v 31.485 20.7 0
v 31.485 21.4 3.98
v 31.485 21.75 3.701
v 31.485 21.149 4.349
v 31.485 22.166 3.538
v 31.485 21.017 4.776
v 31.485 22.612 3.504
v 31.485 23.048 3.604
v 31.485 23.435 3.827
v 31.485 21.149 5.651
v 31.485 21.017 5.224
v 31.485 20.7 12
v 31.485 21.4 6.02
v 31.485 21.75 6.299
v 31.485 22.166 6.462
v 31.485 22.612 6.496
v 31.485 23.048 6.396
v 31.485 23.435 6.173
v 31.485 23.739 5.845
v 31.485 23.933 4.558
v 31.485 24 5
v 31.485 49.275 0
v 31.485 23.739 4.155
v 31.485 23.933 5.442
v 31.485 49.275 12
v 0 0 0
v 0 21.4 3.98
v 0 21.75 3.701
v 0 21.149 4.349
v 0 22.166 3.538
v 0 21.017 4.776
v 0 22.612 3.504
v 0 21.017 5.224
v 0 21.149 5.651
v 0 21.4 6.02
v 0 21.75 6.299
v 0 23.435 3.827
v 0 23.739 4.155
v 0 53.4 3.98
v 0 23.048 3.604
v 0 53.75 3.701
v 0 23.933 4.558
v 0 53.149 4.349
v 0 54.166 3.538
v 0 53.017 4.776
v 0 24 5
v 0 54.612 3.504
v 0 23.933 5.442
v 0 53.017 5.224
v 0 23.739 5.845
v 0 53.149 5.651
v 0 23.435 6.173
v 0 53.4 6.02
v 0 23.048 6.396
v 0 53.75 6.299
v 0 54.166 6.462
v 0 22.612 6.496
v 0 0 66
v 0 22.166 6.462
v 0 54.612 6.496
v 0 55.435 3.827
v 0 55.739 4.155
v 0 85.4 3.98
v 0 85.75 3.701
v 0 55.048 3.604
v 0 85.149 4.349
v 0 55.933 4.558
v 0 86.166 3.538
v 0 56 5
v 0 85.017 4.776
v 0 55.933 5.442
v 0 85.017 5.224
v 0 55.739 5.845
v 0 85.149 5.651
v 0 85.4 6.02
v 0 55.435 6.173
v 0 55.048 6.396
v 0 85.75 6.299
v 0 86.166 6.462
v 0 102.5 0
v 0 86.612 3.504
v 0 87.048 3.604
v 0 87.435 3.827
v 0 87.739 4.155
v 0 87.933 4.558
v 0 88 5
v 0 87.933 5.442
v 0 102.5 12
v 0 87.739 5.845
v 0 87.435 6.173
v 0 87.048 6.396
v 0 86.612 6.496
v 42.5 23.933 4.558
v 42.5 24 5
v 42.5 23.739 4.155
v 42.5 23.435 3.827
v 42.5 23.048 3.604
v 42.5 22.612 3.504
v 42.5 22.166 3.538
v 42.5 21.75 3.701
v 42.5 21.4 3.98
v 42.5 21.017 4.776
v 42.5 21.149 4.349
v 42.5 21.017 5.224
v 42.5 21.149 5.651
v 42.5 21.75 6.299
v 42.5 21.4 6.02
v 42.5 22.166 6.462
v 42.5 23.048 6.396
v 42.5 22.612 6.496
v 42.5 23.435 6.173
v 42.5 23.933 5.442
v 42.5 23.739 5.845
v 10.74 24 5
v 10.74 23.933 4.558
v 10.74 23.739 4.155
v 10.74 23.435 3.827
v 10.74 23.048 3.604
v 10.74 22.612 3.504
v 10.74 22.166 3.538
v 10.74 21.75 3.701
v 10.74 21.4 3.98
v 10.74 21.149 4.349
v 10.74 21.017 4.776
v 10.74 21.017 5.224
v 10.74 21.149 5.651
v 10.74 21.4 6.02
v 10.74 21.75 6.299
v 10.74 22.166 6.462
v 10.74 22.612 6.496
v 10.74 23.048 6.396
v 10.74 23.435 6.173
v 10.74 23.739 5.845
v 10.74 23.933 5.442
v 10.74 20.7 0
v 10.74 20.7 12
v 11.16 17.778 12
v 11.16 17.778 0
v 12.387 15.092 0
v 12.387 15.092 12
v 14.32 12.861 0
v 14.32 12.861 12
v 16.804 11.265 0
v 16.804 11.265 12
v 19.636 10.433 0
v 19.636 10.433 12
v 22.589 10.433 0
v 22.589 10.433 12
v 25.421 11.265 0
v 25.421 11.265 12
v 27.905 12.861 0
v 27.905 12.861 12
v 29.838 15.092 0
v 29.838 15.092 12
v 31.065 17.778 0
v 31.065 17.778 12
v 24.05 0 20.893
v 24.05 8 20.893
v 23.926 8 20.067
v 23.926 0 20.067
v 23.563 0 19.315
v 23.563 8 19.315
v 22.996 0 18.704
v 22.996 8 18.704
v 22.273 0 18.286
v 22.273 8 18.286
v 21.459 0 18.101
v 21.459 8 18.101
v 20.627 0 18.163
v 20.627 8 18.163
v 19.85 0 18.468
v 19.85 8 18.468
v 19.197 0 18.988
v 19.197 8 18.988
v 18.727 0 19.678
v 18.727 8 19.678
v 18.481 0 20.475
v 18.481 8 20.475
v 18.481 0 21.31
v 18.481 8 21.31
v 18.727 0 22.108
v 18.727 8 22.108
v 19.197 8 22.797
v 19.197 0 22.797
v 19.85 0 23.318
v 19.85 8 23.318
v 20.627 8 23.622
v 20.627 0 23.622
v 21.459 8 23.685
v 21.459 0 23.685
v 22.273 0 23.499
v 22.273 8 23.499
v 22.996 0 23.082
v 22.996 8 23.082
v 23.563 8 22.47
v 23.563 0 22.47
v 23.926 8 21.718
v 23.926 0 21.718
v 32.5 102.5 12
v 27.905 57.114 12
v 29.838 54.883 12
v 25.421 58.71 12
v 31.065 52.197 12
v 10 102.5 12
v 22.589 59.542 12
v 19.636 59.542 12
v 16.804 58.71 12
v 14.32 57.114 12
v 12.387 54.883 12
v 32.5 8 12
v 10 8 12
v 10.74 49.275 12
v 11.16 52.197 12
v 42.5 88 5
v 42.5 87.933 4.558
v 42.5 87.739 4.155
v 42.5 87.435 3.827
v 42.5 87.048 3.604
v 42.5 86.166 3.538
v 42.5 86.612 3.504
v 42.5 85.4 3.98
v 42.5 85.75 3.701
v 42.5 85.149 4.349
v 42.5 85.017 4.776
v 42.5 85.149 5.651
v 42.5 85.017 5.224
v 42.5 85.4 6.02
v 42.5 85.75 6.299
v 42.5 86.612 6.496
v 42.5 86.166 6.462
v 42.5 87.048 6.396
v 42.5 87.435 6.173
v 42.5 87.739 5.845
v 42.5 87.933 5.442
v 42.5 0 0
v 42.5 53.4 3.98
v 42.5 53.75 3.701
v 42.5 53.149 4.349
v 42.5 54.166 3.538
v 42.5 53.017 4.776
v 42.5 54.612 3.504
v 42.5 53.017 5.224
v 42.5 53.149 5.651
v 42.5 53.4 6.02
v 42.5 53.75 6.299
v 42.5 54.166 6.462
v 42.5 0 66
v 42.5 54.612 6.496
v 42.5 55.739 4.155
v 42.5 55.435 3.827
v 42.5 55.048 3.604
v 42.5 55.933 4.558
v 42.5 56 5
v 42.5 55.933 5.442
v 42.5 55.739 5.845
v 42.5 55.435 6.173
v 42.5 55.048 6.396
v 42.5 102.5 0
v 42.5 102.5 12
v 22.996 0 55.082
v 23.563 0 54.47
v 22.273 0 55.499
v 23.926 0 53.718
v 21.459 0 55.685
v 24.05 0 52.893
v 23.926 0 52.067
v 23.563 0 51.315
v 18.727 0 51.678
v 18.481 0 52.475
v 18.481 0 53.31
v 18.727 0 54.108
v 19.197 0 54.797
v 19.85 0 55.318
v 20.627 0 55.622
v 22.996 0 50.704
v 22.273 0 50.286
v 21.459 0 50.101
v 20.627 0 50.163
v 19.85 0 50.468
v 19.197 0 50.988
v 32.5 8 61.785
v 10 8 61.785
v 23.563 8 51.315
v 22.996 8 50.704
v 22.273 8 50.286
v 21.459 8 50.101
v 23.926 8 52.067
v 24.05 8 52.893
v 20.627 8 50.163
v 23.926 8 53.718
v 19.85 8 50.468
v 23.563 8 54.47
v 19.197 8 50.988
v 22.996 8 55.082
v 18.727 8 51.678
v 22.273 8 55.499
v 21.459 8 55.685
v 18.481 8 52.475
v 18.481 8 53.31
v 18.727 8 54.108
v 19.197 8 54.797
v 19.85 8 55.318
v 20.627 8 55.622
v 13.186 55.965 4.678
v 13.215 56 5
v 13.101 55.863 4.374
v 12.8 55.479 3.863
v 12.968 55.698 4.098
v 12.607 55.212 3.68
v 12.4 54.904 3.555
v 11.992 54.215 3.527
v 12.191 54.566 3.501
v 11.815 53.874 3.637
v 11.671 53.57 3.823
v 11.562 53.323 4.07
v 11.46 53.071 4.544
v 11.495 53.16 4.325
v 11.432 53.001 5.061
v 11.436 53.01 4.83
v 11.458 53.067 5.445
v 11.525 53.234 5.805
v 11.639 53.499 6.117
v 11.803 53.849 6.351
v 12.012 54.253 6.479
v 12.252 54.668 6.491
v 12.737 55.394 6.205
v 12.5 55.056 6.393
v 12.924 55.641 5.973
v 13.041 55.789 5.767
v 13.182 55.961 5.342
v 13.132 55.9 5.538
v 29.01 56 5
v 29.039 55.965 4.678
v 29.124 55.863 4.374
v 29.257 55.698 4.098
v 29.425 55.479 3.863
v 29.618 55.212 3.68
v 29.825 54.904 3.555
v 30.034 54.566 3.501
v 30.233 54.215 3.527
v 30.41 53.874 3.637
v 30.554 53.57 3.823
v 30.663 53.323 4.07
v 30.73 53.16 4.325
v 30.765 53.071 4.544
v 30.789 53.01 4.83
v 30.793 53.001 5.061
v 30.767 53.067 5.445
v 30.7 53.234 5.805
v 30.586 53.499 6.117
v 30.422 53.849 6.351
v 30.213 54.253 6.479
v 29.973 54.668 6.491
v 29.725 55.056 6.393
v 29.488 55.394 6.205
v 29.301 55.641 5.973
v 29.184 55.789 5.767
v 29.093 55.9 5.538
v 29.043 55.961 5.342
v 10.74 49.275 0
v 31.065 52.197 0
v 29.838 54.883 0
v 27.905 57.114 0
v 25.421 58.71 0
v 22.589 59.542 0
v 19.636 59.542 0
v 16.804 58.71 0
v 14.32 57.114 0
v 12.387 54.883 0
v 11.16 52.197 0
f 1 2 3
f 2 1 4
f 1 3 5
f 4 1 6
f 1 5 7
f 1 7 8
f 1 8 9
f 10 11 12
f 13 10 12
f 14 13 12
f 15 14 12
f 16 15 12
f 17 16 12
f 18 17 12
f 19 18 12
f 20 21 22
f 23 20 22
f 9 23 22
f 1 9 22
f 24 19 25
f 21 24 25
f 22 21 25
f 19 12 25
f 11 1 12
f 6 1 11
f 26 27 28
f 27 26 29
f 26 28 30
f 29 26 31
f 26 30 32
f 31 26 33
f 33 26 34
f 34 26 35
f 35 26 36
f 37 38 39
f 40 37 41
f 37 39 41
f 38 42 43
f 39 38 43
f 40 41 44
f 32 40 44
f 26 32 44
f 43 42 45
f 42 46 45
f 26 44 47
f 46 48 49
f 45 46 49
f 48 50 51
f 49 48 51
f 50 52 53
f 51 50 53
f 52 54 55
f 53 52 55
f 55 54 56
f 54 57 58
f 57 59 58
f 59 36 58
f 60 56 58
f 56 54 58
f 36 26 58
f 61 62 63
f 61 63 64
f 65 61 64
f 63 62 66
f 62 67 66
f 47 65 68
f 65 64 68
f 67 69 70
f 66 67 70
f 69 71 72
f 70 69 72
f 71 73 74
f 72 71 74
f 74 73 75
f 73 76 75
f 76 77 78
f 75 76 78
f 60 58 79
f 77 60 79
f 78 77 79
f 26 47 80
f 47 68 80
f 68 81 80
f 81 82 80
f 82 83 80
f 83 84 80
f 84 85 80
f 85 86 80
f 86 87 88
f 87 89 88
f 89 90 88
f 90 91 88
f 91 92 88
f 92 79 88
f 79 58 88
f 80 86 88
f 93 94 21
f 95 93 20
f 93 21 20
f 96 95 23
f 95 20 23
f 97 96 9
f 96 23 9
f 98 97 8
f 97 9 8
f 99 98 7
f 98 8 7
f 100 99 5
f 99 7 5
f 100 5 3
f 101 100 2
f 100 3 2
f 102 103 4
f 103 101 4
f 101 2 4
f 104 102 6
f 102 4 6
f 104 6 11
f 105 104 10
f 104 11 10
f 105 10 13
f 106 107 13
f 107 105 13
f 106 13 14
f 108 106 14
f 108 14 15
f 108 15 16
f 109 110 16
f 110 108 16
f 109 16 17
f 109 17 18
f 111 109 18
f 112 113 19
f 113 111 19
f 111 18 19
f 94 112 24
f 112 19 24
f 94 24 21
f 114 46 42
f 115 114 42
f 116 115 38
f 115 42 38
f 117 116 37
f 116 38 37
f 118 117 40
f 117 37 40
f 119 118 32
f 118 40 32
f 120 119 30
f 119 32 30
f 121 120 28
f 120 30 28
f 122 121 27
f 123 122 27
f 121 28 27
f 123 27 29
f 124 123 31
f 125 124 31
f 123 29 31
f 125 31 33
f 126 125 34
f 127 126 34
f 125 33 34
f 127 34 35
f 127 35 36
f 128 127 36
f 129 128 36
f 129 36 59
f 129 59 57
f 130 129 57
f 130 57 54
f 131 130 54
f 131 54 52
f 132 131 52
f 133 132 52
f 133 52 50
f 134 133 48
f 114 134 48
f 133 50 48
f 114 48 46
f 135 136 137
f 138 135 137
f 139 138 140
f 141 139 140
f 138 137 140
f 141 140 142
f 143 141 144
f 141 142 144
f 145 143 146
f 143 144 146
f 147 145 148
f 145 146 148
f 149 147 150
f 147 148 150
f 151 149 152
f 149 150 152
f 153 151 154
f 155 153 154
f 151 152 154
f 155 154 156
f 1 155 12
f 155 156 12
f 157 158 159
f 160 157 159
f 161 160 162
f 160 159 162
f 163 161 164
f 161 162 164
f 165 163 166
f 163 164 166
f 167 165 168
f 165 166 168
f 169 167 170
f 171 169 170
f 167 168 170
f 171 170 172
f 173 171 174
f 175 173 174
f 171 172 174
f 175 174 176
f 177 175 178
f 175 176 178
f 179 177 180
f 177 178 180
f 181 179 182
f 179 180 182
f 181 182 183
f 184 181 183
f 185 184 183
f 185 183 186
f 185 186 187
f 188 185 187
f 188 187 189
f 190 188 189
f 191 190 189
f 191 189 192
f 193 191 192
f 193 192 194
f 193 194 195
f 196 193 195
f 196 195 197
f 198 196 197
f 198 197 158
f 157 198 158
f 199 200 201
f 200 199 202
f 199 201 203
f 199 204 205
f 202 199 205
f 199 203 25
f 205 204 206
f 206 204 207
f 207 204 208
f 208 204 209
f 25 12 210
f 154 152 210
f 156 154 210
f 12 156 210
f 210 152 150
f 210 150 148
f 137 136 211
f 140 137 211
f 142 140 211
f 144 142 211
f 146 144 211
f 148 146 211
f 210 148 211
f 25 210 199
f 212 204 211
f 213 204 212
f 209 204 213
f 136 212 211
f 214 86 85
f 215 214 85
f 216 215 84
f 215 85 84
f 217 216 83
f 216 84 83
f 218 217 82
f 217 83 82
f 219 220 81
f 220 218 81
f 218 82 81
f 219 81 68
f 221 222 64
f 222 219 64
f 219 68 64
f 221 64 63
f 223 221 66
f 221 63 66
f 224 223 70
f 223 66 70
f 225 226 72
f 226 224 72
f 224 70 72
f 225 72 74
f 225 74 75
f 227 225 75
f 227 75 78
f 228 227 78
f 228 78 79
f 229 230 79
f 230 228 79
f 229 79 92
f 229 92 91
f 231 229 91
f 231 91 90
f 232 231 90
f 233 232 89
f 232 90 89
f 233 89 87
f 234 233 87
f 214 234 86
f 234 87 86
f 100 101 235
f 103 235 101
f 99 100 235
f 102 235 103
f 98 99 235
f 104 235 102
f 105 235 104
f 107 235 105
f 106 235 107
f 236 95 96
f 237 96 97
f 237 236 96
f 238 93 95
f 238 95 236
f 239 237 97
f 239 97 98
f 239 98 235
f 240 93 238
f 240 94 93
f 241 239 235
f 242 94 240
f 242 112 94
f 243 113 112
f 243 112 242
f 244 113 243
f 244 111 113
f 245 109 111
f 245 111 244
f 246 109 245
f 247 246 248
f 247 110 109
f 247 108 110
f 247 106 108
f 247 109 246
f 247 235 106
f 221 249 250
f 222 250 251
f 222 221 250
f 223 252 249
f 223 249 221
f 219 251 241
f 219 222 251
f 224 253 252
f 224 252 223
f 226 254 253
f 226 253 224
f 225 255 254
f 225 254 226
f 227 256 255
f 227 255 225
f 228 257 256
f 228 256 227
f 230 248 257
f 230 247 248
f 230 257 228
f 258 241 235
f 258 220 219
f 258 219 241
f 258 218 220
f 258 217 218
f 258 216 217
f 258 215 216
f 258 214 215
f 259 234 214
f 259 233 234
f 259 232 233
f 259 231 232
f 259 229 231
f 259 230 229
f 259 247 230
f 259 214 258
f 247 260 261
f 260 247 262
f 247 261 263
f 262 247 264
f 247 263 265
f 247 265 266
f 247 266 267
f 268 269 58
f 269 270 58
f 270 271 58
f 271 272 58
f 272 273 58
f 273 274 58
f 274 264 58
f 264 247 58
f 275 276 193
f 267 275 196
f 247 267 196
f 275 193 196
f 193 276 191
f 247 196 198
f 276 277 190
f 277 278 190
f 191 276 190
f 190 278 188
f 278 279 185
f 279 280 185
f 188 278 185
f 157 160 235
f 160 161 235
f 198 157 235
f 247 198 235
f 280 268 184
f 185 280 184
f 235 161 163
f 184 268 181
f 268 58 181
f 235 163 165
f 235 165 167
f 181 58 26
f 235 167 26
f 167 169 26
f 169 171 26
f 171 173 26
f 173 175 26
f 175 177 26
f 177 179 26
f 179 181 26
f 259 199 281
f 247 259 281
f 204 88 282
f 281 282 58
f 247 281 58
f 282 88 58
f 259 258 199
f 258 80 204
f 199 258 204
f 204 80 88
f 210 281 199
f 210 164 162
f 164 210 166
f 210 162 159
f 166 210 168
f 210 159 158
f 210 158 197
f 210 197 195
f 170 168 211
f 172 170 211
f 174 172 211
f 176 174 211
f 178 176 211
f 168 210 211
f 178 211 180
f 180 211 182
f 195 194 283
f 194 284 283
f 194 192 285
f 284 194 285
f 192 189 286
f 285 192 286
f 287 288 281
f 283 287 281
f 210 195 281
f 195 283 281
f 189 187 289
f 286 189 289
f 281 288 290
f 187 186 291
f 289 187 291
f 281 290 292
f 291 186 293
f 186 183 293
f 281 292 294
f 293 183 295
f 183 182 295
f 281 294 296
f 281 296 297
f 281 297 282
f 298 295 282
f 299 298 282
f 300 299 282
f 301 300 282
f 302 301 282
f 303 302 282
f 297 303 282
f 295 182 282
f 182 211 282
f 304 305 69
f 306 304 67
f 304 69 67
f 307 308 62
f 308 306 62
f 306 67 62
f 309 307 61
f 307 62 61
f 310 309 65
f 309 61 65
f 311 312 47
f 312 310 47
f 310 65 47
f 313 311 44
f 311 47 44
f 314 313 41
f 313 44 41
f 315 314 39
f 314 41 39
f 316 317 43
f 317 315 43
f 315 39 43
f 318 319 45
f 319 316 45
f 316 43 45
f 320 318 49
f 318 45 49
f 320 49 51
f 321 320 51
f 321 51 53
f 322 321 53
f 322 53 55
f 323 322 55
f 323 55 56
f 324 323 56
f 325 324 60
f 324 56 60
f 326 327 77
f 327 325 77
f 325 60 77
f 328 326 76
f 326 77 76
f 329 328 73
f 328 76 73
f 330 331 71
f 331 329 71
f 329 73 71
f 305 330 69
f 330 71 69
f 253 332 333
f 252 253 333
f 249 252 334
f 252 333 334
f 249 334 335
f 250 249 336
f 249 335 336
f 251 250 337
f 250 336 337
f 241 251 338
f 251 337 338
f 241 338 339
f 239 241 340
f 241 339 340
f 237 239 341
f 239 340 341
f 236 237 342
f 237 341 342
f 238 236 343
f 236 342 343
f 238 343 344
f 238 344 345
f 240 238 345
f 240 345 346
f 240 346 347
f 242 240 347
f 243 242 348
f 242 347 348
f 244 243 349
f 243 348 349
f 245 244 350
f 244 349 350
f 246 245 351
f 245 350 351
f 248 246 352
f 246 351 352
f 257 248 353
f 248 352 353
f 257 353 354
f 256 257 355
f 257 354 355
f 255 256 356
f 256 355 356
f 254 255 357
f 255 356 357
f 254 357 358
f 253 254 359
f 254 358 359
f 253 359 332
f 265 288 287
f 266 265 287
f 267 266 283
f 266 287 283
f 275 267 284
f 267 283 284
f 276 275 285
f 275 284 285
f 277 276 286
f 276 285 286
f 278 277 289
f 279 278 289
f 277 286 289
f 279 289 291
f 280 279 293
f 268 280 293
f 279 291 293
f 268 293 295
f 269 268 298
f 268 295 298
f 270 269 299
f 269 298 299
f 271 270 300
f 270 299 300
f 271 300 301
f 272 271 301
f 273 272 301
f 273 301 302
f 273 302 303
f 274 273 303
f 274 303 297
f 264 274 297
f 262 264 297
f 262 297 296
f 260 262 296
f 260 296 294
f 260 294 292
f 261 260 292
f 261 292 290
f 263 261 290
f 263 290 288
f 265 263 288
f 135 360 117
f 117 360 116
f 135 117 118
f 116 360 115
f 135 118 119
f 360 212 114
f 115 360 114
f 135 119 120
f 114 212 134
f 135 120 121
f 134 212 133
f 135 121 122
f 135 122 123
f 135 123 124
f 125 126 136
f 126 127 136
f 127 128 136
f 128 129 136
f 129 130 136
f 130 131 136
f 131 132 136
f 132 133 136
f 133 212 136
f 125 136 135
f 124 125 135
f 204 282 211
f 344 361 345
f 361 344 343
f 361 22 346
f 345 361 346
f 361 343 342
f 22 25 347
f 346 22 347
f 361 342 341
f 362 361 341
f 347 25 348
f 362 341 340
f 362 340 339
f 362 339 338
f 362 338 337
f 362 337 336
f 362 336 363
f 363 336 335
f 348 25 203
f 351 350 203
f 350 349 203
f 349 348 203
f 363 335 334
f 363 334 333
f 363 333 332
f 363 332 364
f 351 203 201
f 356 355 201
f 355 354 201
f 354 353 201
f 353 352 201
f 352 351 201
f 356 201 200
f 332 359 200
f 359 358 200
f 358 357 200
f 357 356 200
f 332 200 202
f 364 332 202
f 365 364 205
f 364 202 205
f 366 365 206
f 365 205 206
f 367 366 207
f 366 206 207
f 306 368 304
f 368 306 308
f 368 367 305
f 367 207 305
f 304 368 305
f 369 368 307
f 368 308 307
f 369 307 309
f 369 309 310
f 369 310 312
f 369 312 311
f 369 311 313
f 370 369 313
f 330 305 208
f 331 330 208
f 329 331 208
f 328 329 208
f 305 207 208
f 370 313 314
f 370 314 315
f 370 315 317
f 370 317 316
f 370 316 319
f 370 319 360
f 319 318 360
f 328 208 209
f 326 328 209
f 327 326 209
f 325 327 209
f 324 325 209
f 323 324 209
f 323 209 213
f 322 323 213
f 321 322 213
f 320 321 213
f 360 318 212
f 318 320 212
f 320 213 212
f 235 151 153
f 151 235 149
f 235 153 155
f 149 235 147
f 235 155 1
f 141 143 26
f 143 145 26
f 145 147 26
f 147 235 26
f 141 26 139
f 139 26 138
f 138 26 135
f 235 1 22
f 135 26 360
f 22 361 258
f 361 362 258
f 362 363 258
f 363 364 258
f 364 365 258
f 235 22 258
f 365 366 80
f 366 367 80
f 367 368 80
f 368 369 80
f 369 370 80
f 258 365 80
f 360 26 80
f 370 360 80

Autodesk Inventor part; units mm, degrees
ref_plane "YZ Plane" through (0, 0, 0) normal (1, 0, 0) x (0, 1, 0)
ref_plane "XZ Plane" through (0, 0, 0) normal (0, 1, 0) x (-1, 0, 0)
ref_plane "XY Plane" through (0, 0, 0) normal (0, 0, 1) x (1, 0, 0)
sketch "Sketch1" plane through (0, 0, 0) normal (1, 0, 0) x (0, 1, 0)
  line L0 (0, 66) -> (0, 0)
  line L1 (-57.5, 0) -> (326.5, 0) construction
  line L2 (102.5, 12) -> (0, 12)
  circle A0 centre (6.5, 5) radius 1.5
  circle A1 centre (22.5, 5) radius 1.5
  circle A2 centre (38.5, 5) radius 1.5
  circle A3 centre (54.5, 5) radius 1.5
  circle A4 centre (70.5, 5) radius 1.5
  circle A5 centre (86.5, 5) radius 1.5
  line L3 (0, 0) -> (102.5, 0)
  line L4 (102.5, 0) -> (102.5, 12)
  line L5 (102.5, 66) -> (0, 66) construction
  line L6 (0, 66) -> (0, 0)
  line L7 (102.5, 12) -> (102.5, 66) construction
  line L8 (102.5, 12) -> (0, 66)
  line L9 (8, 0) -> (8, 61.7854)
  point P0 (8, 12)
  dimension "d0" = 12
  dimension "d1" = 3
  dimension "d2" = 5
  dimension "d3" = 6.5
  dimension "d6" = 16
  dimension "d11" = 16
  dimension "d12" = 66
  dimension "d19" = 8
extrude "Extrusion1" add sketch "Sketch1" along normal blind 10 contours L8 L9 L2 L0 | A0 | L2 L9 L3 L0 | L8 L2 L9 | L2 L4 L3 L9 | A2 | A4
extrude "Extrusion2" add sketch "Sketch1" along normal blind 22.5 from surface at 10 contours L8 L9 L2 L0 | A0 | L2 L9 L3 L0 | L2 L4 L3 L9 | A2 | A4
extrude "Extrusion3" add sketch "Sketch1" along normal blind 10 from surface at 32.5 contours L8 L9 L2 L0 | A0 | L2 L9 L3 L0 | L8 L2 L9 | L2 L4 L3 L9 | A2 | A4
sketch "Sketch2" plane through (10, 8, 61.7854) normal (0, 1, 0) x (1, 0, 0)
  line L0 (22.5, 0) -> (22.5, 49.7854) projected
  line L1 (0, 49.7854) -> (22.5, 49.7854) projected
  line L2 (0, 0) -> (0, 49.7854) projected
  line L3 (0, 0) -> (22.5, 0) projected
  circle A0 centre (11.25, 40.8927) radius 2.8
  circle A1 centre (11.25, 8.8927) radius 2.8
  line L4 (0, 49.7854) -> (22.5, 49.7854) construction
  line L5 (11.25, 49.7854) -> (11.25, 0) construction
  line L6 (0, 0) -> (22.5, 0) construction
  point P0 (-10, 61.7854)
  dimension "d20" = 5.6
  dimension "d21" = 8.8927
  dimension "d22" = 49.7854
  dimension "d23" = 32
extrude "Extrusion4" cut sketch "Sketch2" against normal blind 22.5 contours A0 | A1
sketch "Sketch3" plane through (10, 8, 12) normal (0, 0, 1) x (1, 0, 0)
  line L0 (11.1125, 41.275) -> (11.1125, 12.7) construction
  line L1 (0.74, 41.275) -> (0.74, 12.7)
  line L2 (21.485, 12.7) -> (21.485, 41.275)
  arc A0 (21.485, 41.275) -> (0.74, 41.275) centre (11.1125, 41.275) ccw
  arc A1 (0.74, 12.7) -> (21.485, 12.7) centre (11.1125, 12.7) ccw
  point P0 (-10, -8)
  point P1 (11.1125, 26.9875)
extrude "Extrusion5" cut sketch "Sketch3" against normal through all
equation "\"d21\" = -0.5 * d23 + 0.5 * d22"
properties part number "Slide Support"
